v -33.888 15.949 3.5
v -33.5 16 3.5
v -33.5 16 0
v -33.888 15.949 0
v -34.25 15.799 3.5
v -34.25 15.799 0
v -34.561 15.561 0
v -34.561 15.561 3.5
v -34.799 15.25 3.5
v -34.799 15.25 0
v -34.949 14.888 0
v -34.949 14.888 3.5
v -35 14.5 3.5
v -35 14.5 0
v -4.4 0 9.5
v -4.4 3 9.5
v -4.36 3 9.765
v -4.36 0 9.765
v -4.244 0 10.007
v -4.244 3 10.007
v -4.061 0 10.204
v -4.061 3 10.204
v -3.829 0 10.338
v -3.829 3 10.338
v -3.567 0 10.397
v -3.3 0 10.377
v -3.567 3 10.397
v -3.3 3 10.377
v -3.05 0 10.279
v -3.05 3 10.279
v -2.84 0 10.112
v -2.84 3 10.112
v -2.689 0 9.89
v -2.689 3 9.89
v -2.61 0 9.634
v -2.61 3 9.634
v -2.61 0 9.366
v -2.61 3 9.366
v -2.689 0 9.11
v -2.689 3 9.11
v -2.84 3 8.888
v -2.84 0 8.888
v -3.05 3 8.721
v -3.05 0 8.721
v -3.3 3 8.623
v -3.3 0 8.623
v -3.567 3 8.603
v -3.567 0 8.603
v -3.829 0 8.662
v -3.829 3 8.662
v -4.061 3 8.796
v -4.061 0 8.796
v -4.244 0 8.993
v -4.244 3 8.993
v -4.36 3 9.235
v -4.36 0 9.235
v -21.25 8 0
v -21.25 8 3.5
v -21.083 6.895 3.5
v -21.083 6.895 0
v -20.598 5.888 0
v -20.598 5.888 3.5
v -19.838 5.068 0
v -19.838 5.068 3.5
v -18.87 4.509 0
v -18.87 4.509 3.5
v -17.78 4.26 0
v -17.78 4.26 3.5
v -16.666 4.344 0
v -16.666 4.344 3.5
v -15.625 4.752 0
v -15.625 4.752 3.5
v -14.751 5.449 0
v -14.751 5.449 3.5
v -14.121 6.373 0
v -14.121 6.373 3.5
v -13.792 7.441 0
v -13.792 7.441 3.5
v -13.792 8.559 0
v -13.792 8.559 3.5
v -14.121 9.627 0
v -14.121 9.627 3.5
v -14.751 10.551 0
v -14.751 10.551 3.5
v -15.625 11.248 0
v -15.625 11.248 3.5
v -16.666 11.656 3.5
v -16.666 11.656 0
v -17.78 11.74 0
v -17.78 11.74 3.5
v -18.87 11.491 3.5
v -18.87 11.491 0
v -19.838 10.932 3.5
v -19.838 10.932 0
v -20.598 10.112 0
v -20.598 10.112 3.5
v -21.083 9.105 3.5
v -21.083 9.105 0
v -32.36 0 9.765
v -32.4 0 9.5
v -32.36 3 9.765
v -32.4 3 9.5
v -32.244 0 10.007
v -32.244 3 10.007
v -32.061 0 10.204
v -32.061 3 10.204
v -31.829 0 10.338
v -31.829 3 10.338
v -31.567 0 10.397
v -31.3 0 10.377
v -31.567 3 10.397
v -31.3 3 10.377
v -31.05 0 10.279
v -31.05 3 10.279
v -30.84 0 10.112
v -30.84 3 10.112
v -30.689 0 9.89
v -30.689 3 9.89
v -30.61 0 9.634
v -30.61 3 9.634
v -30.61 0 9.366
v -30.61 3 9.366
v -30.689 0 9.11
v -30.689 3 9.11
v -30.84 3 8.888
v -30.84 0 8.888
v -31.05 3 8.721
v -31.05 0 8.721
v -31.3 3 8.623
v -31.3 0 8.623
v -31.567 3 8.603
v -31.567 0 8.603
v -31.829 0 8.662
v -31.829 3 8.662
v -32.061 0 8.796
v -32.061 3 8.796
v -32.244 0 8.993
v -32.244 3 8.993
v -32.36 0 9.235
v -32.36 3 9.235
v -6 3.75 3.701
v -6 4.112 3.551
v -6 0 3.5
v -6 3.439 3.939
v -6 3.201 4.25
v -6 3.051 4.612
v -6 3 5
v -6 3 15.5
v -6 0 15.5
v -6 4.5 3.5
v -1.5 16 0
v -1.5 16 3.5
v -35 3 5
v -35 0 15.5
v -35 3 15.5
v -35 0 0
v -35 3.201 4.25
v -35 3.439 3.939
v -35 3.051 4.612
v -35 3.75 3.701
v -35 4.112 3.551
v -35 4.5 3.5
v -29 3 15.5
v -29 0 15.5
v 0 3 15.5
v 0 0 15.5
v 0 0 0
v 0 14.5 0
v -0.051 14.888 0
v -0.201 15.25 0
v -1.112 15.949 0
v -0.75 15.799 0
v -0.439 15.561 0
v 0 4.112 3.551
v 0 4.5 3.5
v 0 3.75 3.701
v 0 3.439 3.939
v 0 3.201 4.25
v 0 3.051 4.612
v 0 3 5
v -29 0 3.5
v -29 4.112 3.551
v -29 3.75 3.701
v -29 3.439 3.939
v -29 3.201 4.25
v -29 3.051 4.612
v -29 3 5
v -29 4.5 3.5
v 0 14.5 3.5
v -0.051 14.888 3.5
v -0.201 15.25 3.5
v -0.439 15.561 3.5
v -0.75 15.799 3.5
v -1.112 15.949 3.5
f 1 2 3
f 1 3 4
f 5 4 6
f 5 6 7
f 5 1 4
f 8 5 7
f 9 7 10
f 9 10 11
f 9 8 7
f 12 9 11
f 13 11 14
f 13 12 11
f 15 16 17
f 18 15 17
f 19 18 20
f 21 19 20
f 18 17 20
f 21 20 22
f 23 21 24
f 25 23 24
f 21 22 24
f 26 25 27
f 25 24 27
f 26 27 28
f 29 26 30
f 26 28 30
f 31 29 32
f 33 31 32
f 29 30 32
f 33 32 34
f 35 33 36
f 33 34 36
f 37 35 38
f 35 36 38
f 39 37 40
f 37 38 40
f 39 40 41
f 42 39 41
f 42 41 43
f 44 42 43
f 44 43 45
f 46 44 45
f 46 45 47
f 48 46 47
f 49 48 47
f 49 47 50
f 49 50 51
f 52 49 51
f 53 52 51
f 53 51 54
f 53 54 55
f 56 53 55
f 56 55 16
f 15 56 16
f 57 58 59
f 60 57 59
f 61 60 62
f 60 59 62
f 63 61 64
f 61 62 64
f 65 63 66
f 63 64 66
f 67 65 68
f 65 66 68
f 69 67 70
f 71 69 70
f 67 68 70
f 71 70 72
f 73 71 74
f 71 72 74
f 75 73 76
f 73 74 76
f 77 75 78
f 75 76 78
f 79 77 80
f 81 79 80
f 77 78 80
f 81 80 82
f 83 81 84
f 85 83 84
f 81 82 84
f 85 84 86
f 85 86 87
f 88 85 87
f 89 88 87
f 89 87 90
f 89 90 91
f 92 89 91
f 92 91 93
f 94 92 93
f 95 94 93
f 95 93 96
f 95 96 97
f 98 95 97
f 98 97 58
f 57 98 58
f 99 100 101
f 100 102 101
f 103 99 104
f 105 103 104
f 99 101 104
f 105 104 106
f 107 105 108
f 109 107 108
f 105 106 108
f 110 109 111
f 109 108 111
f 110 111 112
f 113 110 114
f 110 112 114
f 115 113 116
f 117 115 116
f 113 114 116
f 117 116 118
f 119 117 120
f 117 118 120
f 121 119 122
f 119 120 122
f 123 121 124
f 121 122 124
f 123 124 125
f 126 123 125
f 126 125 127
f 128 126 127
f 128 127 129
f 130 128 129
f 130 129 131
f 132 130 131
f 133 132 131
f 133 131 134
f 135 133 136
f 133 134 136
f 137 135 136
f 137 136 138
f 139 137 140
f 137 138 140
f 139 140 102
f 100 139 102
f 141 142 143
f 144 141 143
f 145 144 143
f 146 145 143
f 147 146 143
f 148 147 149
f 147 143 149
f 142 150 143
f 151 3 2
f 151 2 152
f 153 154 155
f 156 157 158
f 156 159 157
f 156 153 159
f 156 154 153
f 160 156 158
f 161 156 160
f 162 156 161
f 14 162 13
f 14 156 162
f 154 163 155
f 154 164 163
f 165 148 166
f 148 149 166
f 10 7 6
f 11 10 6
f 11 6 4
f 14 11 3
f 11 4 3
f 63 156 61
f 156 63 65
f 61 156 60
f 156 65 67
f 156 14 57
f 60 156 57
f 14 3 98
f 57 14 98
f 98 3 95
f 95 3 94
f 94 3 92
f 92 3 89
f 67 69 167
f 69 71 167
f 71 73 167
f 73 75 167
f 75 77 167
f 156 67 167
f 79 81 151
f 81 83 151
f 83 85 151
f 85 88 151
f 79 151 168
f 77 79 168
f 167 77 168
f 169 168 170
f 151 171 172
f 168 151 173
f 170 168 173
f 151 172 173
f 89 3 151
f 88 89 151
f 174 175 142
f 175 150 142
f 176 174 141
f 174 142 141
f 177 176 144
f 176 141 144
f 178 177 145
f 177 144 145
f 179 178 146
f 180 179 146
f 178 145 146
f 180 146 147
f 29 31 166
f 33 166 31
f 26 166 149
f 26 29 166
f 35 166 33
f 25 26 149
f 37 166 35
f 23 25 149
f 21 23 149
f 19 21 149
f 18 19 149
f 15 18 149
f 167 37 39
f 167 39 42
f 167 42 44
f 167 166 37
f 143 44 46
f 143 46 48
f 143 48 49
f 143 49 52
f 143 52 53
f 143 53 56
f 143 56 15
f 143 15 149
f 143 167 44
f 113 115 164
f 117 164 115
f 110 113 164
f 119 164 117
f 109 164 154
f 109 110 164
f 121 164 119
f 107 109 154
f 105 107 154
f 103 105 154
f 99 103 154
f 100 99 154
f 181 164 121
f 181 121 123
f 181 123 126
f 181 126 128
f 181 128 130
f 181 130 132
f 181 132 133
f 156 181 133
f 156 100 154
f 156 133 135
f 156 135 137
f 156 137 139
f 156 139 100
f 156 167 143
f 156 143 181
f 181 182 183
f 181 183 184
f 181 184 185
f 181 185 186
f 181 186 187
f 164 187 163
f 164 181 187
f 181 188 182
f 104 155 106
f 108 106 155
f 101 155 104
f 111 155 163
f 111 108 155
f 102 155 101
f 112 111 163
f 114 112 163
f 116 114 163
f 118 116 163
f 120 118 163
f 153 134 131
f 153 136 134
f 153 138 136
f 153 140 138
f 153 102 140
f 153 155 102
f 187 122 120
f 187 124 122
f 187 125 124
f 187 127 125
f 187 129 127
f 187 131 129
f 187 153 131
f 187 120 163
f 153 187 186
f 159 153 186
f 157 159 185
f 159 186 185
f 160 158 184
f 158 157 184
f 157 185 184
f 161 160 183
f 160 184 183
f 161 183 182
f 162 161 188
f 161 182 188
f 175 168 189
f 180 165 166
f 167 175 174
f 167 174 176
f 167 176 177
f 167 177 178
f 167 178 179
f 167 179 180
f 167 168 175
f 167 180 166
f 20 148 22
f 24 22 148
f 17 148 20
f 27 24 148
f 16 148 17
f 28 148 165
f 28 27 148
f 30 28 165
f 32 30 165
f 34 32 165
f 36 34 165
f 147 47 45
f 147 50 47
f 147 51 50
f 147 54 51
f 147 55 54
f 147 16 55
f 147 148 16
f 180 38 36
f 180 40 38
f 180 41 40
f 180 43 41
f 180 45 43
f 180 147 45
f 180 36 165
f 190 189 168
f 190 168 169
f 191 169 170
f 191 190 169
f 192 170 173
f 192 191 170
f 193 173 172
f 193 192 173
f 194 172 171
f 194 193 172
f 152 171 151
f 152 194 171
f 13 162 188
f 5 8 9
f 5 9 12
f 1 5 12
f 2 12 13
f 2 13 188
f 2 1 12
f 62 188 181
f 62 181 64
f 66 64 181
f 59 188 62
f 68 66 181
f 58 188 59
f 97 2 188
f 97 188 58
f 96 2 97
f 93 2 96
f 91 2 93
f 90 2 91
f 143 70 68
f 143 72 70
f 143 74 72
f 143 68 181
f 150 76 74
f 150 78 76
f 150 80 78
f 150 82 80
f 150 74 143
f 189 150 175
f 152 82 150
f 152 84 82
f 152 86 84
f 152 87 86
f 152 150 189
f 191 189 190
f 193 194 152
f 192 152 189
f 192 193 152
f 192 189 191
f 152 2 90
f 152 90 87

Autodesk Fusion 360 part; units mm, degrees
sketch "Sketch1" plane through (0, 0, 0) normal (0, 0, 1) x (1, 0, 0)
  line L0 (0, 0) -> (-35, 0)
  line L1 (-35, 0) -> (-35, 16)
  line L2 (-35, 16) -> (0, 16)
  line L3 (0, 16) -> (0, 0)
  dimension "d14" = 16
  dimension "d15" = 35
extrude "Extrude1" add sketch "Sketch1" along normal blind 3.5
sketch "Sketch3" plane through (0, 0, 0) normal (0, 1, 0) x (1, 0, 0)
  line L0 (0, -3.5) -> (-6, -3.5)
  line L1 (-6, -3.5) -> (-6, -15.5)
  line L2 (-6, -15.5) -> (0, -15.5)
  line L3 (0, -15.5) -> (0, -3.5)
  line L4 (-35, -3.5) -> (-29, -3.5)
  line L5 (-29, -3.5) -> (-29, -15.5)
  line L6 (-29, -15.5) -> (-35, -15.5)
  line L7 (-35, -15.5) -> (-35, -3.5)
  point P0 (0, -3.5)
  point P1 (-35, -3.5)
  dimension "d17" = 12
  dimension "d19" = 23
extrude "Extrude3" add sketch "Sketch3" along normal blind 3
sketch "Sketch4" plane through (0, 0, 3.5) normal (0, 0, 1) x (-1, 0, 0)
  line L0 (6, 0) -> (6, -3)
  line L1 (6, -3) -> (0, -3)
  line L2 (0, -3) -> (0, -16)
  line L3 (0, -16) -> (35, -16)
  line L4 (35, -16) -> (35, -3)
  line L5 (35, -3) -> (29, -3)
  line L6 (29, -3) -> (29, 0)
  line L7 (29, 0) -> (6, 0)
  line L8 (0, -16) -> (35, 0) construction
  line L9 (35, -16) -> (0, 0) construction
  circle A0 centre (17.5, -8) radius 3.75
  dimension "d22" = 7.5
extrude "Extrude4" cut sketch "Sketch4" against normal up to surface (3.5 mm away) contours A0
sketch "Sketch7" plane through (0, 3, 0) normal (0, 1, 0) x (-1, 0, 0)
  line L0 (0, 15.5) -> (0, 3.5)
  line L1 (0, 3.5) -> (6, 3.5)
  line L2 (6, 3.5) -> (6, 15.5)
  line L3 (6, 15.5) -> (0, 15.5)
  line L4 (0, 9.5) -> (35, 9.5) construction
  line L5 (35, 3.5) -> (35, 15.5) construction
  circle A0 centre (3.5, 9.5) radius 0.9
  circle A1 centre (31.5, 9.5) radius 0.9
  line L6 (32.4, 9.5) -> (32.3186, 9.874) construction
  point P0 (17.5, 9.5)
  dimension "d30" = 1.8
  dimension "d31" = 14
  dimension "d32" = 1.8
  dimension "d33" = 14
extrude "Extrude6" cut sketch "Sketch7" against normal up to surface (3 mm away) contours A0 | A1
fillet "Fillet1" radius 1.5 2 edges at (-3, 3, 3.5) (-32, 3, 3.5)
fillet "Fillet2" radius 1.5 2 edges at (0, 16, 1.75) (-35, 16, 1.75)
extrude "Extrude2" [suppressed]
hole "Hole1" [suppressed]
hole "Hole2" [suppressed]
hole "Hole3" [suppressed]
